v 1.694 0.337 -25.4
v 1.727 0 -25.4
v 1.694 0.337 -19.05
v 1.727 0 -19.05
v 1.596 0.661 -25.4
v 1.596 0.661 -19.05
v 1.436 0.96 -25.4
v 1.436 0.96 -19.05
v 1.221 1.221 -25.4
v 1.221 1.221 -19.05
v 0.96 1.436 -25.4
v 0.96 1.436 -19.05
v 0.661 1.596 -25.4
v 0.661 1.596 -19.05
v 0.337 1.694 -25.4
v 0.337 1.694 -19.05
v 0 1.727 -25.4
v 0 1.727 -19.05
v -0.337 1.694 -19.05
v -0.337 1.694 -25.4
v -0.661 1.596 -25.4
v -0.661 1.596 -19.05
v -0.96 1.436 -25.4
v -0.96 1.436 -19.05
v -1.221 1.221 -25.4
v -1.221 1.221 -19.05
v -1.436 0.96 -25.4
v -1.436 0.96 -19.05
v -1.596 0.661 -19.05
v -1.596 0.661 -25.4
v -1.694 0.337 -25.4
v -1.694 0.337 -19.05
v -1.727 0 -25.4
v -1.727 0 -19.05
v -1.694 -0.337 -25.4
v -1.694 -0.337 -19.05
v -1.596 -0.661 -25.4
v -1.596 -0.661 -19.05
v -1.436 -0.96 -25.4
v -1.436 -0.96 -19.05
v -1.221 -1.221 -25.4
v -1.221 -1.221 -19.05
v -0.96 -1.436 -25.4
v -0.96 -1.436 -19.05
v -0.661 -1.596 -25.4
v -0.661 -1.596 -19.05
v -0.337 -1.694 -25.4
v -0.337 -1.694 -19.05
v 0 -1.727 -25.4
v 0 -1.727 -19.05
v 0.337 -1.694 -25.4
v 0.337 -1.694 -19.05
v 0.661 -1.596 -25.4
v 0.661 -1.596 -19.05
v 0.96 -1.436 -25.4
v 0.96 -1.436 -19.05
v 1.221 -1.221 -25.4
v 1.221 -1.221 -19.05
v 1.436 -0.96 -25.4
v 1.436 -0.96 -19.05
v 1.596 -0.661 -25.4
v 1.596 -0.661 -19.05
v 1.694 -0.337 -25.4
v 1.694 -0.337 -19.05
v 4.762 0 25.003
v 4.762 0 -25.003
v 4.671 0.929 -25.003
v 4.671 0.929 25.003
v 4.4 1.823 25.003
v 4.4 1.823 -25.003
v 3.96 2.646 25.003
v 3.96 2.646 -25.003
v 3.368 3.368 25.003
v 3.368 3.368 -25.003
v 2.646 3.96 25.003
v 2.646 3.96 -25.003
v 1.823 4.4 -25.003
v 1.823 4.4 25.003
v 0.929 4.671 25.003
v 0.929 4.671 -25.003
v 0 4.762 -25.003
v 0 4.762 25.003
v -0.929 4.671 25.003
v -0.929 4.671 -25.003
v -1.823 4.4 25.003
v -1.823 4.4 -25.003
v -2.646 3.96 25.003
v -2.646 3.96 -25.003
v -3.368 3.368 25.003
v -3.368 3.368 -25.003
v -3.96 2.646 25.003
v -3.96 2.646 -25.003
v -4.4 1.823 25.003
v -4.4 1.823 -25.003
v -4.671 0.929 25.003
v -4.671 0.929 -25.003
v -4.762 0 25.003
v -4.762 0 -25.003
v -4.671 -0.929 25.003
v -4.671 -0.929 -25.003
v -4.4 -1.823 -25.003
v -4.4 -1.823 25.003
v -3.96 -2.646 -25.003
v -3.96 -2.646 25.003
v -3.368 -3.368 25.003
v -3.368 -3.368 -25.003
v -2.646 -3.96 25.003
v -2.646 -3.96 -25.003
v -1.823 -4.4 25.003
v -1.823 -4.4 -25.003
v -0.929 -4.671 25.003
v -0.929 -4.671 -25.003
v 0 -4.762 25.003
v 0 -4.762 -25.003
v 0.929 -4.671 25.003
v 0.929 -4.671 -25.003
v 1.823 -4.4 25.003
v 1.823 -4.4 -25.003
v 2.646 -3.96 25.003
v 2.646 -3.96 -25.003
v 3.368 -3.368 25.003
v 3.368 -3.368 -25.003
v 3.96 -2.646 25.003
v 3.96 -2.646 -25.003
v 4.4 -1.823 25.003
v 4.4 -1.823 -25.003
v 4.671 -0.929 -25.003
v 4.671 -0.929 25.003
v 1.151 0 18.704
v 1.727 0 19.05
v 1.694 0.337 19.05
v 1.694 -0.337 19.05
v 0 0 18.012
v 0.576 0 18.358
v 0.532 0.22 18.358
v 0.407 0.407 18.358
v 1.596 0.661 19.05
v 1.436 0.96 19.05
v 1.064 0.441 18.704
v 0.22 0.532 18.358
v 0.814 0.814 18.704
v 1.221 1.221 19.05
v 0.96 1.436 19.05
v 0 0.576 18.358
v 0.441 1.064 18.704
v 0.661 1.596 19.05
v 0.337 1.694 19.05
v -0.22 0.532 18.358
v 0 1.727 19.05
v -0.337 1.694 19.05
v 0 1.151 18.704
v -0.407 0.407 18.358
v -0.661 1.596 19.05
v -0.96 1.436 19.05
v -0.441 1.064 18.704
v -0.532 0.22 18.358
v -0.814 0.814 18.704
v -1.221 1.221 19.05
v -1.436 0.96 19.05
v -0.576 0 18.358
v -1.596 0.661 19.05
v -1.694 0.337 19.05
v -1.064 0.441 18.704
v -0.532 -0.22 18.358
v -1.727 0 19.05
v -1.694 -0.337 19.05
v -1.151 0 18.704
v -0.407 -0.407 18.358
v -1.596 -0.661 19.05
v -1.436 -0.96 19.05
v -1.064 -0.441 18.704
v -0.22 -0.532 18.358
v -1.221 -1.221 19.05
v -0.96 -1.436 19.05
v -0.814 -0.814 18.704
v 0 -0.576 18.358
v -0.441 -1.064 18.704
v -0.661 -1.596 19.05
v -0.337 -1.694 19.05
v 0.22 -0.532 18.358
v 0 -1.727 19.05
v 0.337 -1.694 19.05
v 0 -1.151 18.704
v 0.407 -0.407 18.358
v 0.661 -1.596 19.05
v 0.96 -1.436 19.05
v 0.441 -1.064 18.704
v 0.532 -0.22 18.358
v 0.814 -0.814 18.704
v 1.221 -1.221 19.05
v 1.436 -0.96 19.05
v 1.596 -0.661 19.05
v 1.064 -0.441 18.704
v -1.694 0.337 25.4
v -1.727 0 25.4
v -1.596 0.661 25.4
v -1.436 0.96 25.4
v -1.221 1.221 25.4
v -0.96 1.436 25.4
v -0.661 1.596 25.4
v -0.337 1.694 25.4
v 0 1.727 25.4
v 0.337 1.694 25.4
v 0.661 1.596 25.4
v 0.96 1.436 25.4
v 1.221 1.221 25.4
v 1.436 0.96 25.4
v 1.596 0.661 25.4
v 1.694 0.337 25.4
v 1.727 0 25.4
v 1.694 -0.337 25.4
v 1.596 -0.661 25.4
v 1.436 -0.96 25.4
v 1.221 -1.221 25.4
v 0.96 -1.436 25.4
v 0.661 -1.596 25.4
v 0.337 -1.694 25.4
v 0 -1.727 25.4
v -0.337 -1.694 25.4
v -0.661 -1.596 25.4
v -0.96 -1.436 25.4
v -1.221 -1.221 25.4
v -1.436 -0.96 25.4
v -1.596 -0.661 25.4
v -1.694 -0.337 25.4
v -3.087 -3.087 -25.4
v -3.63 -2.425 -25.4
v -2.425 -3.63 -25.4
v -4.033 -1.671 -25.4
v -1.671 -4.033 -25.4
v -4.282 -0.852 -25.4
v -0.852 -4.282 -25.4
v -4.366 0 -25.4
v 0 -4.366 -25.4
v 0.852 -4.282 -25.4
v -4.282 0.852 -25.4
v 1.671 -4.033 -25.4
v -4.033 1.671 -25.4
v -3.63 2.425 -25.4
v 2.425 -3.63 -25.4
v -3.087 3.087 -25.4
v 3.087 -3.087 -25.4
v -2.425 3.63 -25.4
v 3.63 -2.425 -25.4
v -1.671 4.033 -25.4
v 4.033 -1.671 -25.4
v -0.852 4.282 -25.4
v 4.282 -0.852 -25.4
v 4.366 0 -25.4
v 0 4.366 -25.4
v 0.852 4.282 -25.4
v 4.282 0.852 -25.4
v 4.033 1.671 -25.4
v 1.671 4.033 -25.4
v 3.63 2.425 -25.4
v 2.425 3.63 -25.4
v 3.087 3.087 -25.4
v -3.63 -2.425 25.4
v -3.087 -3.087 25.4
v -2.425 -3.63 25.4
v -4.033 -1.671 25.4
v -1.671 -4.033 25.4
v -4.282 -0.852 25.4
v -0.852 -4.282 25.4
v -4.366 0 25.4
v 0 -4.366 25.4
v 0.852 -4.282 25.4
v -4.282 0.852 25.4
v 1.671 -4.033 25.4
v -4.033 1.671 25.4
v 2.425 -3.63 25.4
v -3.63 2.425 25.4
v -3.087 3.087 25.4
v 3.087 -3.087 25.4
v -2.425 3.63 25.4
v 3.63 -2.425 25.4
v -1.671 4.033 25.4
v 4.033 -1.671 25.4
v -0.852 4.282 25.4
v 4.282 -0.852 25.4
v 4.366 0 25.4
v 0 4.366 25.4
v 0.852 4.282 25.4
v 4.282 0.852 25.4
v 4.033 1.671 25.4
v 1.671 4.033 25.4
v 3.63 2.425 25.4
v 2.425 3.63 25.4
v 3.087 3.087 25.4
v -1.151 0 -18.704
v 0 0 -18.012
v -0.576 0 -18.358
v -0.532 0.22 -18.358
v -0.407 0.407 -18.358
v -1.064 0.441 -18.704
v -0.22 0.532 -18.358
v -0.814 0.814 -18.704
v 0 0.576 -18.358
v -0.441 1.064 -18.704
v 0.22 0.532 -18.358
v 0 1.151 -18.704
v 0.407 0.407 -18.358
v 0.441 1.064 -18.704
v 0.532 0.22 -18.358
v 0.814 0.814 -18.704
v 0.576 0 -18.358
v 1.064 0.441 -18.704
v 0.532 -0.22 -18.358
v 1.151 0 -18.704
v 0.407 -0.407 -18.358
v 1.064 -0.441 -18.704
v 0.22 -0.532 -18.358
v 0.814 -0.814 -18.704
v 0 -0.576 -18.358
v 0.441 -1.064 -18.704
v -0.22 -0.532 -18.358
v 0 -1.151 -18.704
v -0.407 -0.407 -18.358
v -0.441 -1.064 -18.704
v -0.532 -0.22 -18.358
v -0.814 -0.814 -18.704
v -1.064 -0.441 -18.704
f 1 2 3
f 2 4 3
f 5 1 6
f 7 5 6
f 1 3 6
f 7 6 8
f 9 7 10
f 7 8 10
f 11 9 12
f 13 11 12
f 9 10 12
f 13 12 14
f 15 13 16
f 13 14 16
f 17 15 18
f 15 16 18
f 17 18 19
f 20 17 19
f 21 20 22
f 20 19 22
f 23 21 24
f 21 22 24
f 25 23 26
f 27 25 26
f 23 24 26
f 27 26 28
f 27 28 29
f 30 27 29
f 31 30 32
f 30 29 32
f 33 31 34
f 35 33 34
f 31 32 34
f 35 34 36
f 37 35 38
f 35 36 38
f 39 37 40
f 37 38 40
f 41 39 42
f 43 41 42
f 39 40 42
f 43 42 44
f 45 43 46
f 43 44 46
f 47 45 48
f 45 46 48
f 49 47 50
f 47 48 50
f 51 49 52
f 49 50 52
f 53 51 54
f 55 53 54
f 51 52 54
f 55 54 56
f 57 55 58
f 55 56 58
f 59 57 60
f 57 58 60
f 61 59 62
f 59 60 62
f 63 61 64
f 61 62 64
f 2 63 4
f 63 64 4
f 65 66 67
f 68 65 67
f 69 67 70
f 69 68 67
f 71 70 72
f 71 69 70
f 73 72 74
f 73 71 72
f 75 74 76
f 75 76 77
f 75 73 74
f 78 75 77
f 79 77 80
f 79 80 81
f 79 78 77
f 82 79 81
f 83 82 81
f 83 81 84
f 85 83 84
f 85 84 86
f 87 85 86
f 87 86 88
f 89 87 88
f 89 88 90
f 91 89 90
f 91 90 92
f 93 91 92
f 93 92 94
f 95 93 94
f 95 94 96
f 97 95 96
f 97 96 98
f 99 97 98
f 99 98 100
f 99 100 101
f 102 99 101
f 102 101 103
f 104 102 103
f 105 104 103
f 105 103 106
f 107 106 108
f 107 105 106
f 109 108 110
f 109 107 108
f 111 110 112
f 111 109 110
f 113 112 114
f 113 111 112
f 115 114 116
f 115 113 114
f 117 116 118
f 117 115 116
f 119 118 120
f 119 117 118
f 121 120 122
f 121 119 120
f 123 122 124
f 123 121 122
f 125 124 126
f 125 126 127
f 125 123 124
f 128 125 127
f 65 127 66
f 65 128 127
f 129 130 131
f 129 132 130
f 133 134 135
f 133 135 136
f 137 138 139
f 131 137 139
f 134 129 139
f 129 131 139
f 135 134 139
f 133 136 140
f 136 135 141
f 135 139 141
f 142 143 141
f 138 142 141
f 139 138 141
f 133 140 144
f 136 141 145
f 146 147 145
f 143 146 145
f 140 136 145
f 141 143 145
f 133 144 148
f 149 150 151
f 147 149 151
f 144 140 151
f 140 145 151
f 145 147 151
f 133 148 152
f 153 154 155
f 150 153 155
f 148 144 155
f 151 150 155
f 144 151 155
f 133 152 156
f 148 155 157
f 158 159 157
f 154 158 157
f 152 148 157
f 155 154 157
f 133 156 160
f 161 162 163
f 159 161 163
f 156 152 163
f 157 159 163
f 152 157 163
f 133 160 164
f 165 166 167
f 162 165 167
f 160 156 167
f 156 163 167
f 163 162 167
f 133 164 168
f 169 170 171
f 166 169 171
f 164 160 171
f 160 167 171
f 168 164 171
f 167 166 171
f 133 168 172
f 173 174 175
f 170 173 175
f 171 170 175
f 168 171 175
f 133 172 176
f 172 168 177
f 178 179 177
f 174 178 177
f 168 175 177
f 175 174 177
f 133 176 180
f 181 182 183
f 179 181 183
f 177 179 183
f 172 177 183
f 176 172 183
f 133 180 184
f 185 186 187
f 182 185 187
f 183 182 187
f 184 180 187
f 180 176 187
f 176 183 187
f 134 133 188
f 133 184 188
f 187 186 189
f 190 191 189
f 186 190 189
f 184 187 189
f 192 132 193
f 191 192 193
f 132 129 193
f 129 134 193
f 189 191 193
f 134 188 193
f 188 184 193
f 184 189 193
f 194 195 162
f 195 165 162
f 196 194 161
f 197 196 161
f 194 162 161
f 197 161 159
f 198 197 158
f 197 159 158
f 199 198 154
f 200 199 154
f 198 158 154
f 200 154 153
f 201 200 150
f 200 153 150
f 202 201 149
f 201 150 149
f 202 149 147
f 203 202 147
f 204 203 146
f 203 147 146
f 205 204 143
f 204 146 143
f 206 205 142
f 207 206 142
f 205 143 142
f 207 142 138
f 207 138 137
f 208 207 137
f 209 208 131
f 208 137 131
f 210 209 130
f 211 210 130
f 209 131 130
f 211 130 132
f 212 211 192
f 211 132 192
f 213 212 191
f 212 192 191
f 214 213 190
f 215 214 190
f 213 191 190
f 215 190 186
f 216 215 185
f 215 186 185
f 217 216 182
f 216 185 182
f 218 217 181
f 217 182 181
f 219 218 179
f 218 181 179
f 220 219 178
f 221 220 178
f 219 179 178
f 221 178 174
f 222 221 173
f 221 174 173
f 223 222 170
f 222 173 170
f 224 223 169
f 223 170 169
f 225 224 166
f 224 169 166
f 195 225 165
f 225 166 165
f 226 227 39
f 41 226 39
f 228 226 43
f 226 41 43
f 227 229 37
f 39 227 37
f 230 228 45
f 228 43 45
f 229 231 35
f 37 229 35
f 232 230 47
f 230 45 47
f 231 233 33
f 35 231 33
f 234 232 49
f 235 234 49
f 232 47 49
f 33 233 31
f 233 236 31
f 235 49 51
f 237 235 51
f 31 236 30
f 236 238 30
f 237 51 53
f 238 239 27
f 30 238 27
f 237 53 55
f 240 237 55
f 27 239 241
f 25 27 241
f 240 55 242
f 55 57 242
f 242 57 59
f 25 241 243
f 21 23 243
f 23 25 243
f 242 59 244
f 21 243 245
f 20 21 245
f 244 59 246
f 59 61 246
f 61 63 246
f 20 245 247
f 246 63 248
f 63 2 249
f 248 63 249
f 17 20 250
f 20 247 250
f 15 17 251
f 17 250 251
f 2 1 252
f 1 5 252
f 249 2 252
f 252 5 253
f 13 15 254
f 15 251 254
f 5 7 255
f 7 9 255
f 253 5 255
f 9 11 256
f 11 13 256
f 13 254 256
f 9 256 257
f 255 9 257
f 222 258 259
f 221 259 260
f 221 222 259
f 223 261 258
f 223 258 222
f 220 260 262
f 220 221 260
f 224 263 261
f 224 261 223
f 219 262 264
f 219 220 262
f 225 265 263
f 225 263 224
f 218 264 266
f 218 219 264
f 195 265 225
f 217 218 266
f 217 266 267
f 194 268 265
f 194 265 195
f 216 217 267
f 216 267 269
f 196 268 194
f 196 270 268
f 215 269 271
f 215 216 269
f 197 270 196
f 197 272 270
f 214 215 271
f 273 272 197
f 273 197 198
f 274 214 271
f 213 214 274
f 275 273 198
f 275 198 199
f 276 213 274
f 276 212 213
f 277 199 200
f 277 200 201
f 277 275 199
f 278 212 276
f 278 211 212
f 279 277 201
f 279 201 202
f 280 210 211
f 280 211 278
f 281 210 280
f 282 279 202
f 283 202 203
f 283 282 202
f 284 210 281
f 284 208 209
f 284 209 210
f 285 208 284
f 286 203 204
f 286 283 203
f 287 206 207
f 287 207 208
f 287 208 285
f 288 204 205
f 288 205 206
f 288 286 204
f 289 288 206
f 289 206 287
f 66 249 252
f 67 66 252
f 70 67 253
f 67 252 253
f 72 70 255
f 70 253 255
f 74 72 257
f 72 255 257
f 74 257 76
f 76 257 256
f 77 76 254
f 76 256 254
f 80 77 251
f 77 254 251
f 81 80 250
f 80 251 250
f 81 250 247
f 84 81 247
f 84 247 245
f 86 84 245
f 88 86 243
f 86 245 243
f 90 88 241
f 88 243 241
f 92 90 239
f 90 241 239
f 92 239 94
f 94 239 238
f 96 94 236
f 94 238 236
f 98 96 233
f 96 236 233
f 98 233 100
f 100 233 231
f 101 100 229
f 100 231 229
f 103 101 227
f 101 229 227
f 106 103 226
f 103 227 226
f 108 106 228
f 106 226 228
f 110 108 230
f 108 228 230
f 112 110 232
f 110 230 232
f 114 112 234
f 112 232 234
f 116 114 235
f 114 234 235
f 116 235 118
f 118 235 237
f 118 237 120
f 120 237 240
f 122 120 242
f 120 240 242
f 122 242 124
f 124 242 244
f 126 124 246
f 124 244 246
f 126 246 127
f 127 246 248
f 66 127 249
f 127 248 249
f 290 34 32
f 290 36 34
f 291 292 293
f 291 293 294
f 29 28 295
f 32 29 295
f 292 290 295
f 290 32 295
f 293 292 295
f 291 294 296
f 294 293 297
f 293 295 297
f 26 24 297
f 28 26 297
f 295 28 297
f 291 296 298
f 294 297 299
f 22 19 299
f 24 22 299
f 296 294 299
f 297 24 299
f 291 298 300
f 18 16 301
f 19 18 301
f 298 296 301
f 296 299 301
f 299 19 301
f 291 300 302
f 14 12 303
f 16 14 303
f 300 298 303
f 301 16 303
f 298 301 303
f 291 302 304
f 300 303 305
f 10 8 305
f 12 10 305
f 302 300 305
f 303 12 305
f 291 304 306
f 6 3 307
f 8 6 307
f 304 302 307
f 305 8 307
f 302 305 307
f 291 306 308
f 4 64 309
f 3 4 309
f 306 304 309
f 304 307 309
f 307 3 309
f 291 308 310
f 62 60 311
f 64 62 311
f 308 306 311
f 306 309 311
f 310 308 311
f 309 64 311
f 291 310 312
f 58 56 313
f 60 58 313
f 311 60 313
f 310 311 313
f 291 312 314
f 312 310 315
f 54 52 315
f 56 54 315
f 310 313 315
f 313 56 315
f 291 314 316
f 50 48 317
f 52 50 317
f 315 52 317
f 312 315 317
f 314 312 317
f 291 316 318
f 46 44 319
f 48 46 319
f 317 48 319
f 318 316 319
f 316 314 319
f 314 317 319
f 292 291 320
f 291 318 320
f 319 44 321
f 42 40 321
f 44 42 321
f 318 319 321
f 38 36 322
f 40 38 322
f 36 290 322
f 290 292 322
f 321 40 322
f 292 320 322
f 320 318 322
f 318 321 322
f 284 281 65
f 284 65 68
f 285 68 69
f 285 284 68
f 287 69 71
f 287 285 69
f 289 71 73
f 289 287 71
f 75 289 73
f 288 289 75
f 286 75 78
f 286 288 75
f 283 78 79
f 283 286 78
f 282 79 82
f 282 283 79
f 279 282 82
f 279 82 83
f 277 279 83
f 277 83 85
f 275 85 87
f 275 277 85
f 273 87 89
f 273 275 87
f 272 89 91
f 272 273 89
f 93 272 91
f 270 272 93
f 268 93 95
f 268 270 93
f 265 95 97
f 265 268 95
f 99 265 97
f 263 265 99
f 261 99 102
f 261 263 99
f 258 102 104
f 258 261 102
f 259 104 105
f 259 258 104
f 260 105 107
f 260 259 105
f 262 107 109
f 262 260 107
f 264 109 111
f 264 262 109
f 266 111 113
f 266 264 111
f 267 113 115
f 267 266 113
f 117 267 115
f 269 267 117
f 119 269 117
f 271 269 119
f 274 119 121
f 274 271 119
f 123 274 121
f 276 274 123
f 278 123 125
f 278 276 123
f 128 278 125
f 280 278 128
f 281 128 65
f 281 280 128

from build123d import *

# Parameters (mm, degrees)
SKETCH1_R                               = 4.7625
BOSS_EXTRUDE1_DEPTH                     = 25.4
TAP_DRILL_FOR_8_32_TAP1_D               = 3.4544
TAP_DRILL_FOR_8_32_TAP1_DEPTH           = 6.35
TAP_DRILL_FOR_8_32_TAP1_TIP             = 1.037806461
TAP_DRILL_FOR_8_32_TAP1_ON_FACE_2_D     = 3.4544
TAP_DRILL_FOR_8_32_TAP1_ON_FACE_2_DEPTH = 6.35
TAP_DRILL_FOR_8_32_TAP1_ON_FACE_2_TIP   = 1.037806461
CHAMFER1_SIZE                           = 0.396875


with BuildPart() as part:
    # Sketch1 → Boss-Extrude1 (new, symmetric)
    with BuildSketch(Plane.XY):
        Circle(SKETCH1_R)
    extrude(amount=BOSS_EXTRUDE1_DEPTH, both=True)

    # Tap Drill for #8-32 Tap1
    with Locations(Plane.XY.offset(25.4)):
        with Locations((0, 0)):
            Hole(TAP_DRILL_FOR_8_32_TAP1_D / 2, depth=TAP_DRILL_FOR_8_32_TAP1_DEPTH)
            with Locations((0, 0, -(TAP_DRILL_FOR_8_32_TAP1_DEPTH + TAP_DRILL_FOR_8_32_TAP1_TIP / 2))):  # 118° drill point
                Cone(0, TAP_DRILL_FOR_8_32_TAP1_D / 2, TAP_DRILL_FOR_8_32_TAP1_TIP, mode=Mode.SUBTRACT)

    # Tap Drill for #8-32 Tap1 on face 2
    with Locations(Plane(origin=(0, 0, -25.4), x_dir=(-1, 0, 0), z_dir=(0, 0, -1))):
        with Locations((0, 0)):
            Hole(TAP_DRILL_FOR_8_32_TAP1_ON_FACE_2_D / 2, depth=TAP_DRILL_FOR_8_32_TAP1_ON_FACE_2_DEPTH)
            with Locations((0, 0, -(TAP_DRILL_FOR_8_32_TAP1_ON_FACE_2_DEPTH + TAP_DRILL_FOR_8_32_TAP1_ON_FACE_2_TIP / 2))):  # 118° drill point
                Cone(0, TAP_DRILL_FOR_8_32_TAP1_ON_FACE_2_D / 2, TAP_DRILL_FOR_8_32_TAP1_ON_FACE_2_TIP, mode=Mode.SUBTRACT)

    # Chamfer1
    chamfer1_edges = [part.edges().sort_by_distance(p)[0] for p in [
        (-4.7625, 0, -25.4),
        (-4.7625, 0, 25.4),
    ]]
    chamfer(chamfer1_edges, length=CHAMFER1_SIZE)


solid = part.part
